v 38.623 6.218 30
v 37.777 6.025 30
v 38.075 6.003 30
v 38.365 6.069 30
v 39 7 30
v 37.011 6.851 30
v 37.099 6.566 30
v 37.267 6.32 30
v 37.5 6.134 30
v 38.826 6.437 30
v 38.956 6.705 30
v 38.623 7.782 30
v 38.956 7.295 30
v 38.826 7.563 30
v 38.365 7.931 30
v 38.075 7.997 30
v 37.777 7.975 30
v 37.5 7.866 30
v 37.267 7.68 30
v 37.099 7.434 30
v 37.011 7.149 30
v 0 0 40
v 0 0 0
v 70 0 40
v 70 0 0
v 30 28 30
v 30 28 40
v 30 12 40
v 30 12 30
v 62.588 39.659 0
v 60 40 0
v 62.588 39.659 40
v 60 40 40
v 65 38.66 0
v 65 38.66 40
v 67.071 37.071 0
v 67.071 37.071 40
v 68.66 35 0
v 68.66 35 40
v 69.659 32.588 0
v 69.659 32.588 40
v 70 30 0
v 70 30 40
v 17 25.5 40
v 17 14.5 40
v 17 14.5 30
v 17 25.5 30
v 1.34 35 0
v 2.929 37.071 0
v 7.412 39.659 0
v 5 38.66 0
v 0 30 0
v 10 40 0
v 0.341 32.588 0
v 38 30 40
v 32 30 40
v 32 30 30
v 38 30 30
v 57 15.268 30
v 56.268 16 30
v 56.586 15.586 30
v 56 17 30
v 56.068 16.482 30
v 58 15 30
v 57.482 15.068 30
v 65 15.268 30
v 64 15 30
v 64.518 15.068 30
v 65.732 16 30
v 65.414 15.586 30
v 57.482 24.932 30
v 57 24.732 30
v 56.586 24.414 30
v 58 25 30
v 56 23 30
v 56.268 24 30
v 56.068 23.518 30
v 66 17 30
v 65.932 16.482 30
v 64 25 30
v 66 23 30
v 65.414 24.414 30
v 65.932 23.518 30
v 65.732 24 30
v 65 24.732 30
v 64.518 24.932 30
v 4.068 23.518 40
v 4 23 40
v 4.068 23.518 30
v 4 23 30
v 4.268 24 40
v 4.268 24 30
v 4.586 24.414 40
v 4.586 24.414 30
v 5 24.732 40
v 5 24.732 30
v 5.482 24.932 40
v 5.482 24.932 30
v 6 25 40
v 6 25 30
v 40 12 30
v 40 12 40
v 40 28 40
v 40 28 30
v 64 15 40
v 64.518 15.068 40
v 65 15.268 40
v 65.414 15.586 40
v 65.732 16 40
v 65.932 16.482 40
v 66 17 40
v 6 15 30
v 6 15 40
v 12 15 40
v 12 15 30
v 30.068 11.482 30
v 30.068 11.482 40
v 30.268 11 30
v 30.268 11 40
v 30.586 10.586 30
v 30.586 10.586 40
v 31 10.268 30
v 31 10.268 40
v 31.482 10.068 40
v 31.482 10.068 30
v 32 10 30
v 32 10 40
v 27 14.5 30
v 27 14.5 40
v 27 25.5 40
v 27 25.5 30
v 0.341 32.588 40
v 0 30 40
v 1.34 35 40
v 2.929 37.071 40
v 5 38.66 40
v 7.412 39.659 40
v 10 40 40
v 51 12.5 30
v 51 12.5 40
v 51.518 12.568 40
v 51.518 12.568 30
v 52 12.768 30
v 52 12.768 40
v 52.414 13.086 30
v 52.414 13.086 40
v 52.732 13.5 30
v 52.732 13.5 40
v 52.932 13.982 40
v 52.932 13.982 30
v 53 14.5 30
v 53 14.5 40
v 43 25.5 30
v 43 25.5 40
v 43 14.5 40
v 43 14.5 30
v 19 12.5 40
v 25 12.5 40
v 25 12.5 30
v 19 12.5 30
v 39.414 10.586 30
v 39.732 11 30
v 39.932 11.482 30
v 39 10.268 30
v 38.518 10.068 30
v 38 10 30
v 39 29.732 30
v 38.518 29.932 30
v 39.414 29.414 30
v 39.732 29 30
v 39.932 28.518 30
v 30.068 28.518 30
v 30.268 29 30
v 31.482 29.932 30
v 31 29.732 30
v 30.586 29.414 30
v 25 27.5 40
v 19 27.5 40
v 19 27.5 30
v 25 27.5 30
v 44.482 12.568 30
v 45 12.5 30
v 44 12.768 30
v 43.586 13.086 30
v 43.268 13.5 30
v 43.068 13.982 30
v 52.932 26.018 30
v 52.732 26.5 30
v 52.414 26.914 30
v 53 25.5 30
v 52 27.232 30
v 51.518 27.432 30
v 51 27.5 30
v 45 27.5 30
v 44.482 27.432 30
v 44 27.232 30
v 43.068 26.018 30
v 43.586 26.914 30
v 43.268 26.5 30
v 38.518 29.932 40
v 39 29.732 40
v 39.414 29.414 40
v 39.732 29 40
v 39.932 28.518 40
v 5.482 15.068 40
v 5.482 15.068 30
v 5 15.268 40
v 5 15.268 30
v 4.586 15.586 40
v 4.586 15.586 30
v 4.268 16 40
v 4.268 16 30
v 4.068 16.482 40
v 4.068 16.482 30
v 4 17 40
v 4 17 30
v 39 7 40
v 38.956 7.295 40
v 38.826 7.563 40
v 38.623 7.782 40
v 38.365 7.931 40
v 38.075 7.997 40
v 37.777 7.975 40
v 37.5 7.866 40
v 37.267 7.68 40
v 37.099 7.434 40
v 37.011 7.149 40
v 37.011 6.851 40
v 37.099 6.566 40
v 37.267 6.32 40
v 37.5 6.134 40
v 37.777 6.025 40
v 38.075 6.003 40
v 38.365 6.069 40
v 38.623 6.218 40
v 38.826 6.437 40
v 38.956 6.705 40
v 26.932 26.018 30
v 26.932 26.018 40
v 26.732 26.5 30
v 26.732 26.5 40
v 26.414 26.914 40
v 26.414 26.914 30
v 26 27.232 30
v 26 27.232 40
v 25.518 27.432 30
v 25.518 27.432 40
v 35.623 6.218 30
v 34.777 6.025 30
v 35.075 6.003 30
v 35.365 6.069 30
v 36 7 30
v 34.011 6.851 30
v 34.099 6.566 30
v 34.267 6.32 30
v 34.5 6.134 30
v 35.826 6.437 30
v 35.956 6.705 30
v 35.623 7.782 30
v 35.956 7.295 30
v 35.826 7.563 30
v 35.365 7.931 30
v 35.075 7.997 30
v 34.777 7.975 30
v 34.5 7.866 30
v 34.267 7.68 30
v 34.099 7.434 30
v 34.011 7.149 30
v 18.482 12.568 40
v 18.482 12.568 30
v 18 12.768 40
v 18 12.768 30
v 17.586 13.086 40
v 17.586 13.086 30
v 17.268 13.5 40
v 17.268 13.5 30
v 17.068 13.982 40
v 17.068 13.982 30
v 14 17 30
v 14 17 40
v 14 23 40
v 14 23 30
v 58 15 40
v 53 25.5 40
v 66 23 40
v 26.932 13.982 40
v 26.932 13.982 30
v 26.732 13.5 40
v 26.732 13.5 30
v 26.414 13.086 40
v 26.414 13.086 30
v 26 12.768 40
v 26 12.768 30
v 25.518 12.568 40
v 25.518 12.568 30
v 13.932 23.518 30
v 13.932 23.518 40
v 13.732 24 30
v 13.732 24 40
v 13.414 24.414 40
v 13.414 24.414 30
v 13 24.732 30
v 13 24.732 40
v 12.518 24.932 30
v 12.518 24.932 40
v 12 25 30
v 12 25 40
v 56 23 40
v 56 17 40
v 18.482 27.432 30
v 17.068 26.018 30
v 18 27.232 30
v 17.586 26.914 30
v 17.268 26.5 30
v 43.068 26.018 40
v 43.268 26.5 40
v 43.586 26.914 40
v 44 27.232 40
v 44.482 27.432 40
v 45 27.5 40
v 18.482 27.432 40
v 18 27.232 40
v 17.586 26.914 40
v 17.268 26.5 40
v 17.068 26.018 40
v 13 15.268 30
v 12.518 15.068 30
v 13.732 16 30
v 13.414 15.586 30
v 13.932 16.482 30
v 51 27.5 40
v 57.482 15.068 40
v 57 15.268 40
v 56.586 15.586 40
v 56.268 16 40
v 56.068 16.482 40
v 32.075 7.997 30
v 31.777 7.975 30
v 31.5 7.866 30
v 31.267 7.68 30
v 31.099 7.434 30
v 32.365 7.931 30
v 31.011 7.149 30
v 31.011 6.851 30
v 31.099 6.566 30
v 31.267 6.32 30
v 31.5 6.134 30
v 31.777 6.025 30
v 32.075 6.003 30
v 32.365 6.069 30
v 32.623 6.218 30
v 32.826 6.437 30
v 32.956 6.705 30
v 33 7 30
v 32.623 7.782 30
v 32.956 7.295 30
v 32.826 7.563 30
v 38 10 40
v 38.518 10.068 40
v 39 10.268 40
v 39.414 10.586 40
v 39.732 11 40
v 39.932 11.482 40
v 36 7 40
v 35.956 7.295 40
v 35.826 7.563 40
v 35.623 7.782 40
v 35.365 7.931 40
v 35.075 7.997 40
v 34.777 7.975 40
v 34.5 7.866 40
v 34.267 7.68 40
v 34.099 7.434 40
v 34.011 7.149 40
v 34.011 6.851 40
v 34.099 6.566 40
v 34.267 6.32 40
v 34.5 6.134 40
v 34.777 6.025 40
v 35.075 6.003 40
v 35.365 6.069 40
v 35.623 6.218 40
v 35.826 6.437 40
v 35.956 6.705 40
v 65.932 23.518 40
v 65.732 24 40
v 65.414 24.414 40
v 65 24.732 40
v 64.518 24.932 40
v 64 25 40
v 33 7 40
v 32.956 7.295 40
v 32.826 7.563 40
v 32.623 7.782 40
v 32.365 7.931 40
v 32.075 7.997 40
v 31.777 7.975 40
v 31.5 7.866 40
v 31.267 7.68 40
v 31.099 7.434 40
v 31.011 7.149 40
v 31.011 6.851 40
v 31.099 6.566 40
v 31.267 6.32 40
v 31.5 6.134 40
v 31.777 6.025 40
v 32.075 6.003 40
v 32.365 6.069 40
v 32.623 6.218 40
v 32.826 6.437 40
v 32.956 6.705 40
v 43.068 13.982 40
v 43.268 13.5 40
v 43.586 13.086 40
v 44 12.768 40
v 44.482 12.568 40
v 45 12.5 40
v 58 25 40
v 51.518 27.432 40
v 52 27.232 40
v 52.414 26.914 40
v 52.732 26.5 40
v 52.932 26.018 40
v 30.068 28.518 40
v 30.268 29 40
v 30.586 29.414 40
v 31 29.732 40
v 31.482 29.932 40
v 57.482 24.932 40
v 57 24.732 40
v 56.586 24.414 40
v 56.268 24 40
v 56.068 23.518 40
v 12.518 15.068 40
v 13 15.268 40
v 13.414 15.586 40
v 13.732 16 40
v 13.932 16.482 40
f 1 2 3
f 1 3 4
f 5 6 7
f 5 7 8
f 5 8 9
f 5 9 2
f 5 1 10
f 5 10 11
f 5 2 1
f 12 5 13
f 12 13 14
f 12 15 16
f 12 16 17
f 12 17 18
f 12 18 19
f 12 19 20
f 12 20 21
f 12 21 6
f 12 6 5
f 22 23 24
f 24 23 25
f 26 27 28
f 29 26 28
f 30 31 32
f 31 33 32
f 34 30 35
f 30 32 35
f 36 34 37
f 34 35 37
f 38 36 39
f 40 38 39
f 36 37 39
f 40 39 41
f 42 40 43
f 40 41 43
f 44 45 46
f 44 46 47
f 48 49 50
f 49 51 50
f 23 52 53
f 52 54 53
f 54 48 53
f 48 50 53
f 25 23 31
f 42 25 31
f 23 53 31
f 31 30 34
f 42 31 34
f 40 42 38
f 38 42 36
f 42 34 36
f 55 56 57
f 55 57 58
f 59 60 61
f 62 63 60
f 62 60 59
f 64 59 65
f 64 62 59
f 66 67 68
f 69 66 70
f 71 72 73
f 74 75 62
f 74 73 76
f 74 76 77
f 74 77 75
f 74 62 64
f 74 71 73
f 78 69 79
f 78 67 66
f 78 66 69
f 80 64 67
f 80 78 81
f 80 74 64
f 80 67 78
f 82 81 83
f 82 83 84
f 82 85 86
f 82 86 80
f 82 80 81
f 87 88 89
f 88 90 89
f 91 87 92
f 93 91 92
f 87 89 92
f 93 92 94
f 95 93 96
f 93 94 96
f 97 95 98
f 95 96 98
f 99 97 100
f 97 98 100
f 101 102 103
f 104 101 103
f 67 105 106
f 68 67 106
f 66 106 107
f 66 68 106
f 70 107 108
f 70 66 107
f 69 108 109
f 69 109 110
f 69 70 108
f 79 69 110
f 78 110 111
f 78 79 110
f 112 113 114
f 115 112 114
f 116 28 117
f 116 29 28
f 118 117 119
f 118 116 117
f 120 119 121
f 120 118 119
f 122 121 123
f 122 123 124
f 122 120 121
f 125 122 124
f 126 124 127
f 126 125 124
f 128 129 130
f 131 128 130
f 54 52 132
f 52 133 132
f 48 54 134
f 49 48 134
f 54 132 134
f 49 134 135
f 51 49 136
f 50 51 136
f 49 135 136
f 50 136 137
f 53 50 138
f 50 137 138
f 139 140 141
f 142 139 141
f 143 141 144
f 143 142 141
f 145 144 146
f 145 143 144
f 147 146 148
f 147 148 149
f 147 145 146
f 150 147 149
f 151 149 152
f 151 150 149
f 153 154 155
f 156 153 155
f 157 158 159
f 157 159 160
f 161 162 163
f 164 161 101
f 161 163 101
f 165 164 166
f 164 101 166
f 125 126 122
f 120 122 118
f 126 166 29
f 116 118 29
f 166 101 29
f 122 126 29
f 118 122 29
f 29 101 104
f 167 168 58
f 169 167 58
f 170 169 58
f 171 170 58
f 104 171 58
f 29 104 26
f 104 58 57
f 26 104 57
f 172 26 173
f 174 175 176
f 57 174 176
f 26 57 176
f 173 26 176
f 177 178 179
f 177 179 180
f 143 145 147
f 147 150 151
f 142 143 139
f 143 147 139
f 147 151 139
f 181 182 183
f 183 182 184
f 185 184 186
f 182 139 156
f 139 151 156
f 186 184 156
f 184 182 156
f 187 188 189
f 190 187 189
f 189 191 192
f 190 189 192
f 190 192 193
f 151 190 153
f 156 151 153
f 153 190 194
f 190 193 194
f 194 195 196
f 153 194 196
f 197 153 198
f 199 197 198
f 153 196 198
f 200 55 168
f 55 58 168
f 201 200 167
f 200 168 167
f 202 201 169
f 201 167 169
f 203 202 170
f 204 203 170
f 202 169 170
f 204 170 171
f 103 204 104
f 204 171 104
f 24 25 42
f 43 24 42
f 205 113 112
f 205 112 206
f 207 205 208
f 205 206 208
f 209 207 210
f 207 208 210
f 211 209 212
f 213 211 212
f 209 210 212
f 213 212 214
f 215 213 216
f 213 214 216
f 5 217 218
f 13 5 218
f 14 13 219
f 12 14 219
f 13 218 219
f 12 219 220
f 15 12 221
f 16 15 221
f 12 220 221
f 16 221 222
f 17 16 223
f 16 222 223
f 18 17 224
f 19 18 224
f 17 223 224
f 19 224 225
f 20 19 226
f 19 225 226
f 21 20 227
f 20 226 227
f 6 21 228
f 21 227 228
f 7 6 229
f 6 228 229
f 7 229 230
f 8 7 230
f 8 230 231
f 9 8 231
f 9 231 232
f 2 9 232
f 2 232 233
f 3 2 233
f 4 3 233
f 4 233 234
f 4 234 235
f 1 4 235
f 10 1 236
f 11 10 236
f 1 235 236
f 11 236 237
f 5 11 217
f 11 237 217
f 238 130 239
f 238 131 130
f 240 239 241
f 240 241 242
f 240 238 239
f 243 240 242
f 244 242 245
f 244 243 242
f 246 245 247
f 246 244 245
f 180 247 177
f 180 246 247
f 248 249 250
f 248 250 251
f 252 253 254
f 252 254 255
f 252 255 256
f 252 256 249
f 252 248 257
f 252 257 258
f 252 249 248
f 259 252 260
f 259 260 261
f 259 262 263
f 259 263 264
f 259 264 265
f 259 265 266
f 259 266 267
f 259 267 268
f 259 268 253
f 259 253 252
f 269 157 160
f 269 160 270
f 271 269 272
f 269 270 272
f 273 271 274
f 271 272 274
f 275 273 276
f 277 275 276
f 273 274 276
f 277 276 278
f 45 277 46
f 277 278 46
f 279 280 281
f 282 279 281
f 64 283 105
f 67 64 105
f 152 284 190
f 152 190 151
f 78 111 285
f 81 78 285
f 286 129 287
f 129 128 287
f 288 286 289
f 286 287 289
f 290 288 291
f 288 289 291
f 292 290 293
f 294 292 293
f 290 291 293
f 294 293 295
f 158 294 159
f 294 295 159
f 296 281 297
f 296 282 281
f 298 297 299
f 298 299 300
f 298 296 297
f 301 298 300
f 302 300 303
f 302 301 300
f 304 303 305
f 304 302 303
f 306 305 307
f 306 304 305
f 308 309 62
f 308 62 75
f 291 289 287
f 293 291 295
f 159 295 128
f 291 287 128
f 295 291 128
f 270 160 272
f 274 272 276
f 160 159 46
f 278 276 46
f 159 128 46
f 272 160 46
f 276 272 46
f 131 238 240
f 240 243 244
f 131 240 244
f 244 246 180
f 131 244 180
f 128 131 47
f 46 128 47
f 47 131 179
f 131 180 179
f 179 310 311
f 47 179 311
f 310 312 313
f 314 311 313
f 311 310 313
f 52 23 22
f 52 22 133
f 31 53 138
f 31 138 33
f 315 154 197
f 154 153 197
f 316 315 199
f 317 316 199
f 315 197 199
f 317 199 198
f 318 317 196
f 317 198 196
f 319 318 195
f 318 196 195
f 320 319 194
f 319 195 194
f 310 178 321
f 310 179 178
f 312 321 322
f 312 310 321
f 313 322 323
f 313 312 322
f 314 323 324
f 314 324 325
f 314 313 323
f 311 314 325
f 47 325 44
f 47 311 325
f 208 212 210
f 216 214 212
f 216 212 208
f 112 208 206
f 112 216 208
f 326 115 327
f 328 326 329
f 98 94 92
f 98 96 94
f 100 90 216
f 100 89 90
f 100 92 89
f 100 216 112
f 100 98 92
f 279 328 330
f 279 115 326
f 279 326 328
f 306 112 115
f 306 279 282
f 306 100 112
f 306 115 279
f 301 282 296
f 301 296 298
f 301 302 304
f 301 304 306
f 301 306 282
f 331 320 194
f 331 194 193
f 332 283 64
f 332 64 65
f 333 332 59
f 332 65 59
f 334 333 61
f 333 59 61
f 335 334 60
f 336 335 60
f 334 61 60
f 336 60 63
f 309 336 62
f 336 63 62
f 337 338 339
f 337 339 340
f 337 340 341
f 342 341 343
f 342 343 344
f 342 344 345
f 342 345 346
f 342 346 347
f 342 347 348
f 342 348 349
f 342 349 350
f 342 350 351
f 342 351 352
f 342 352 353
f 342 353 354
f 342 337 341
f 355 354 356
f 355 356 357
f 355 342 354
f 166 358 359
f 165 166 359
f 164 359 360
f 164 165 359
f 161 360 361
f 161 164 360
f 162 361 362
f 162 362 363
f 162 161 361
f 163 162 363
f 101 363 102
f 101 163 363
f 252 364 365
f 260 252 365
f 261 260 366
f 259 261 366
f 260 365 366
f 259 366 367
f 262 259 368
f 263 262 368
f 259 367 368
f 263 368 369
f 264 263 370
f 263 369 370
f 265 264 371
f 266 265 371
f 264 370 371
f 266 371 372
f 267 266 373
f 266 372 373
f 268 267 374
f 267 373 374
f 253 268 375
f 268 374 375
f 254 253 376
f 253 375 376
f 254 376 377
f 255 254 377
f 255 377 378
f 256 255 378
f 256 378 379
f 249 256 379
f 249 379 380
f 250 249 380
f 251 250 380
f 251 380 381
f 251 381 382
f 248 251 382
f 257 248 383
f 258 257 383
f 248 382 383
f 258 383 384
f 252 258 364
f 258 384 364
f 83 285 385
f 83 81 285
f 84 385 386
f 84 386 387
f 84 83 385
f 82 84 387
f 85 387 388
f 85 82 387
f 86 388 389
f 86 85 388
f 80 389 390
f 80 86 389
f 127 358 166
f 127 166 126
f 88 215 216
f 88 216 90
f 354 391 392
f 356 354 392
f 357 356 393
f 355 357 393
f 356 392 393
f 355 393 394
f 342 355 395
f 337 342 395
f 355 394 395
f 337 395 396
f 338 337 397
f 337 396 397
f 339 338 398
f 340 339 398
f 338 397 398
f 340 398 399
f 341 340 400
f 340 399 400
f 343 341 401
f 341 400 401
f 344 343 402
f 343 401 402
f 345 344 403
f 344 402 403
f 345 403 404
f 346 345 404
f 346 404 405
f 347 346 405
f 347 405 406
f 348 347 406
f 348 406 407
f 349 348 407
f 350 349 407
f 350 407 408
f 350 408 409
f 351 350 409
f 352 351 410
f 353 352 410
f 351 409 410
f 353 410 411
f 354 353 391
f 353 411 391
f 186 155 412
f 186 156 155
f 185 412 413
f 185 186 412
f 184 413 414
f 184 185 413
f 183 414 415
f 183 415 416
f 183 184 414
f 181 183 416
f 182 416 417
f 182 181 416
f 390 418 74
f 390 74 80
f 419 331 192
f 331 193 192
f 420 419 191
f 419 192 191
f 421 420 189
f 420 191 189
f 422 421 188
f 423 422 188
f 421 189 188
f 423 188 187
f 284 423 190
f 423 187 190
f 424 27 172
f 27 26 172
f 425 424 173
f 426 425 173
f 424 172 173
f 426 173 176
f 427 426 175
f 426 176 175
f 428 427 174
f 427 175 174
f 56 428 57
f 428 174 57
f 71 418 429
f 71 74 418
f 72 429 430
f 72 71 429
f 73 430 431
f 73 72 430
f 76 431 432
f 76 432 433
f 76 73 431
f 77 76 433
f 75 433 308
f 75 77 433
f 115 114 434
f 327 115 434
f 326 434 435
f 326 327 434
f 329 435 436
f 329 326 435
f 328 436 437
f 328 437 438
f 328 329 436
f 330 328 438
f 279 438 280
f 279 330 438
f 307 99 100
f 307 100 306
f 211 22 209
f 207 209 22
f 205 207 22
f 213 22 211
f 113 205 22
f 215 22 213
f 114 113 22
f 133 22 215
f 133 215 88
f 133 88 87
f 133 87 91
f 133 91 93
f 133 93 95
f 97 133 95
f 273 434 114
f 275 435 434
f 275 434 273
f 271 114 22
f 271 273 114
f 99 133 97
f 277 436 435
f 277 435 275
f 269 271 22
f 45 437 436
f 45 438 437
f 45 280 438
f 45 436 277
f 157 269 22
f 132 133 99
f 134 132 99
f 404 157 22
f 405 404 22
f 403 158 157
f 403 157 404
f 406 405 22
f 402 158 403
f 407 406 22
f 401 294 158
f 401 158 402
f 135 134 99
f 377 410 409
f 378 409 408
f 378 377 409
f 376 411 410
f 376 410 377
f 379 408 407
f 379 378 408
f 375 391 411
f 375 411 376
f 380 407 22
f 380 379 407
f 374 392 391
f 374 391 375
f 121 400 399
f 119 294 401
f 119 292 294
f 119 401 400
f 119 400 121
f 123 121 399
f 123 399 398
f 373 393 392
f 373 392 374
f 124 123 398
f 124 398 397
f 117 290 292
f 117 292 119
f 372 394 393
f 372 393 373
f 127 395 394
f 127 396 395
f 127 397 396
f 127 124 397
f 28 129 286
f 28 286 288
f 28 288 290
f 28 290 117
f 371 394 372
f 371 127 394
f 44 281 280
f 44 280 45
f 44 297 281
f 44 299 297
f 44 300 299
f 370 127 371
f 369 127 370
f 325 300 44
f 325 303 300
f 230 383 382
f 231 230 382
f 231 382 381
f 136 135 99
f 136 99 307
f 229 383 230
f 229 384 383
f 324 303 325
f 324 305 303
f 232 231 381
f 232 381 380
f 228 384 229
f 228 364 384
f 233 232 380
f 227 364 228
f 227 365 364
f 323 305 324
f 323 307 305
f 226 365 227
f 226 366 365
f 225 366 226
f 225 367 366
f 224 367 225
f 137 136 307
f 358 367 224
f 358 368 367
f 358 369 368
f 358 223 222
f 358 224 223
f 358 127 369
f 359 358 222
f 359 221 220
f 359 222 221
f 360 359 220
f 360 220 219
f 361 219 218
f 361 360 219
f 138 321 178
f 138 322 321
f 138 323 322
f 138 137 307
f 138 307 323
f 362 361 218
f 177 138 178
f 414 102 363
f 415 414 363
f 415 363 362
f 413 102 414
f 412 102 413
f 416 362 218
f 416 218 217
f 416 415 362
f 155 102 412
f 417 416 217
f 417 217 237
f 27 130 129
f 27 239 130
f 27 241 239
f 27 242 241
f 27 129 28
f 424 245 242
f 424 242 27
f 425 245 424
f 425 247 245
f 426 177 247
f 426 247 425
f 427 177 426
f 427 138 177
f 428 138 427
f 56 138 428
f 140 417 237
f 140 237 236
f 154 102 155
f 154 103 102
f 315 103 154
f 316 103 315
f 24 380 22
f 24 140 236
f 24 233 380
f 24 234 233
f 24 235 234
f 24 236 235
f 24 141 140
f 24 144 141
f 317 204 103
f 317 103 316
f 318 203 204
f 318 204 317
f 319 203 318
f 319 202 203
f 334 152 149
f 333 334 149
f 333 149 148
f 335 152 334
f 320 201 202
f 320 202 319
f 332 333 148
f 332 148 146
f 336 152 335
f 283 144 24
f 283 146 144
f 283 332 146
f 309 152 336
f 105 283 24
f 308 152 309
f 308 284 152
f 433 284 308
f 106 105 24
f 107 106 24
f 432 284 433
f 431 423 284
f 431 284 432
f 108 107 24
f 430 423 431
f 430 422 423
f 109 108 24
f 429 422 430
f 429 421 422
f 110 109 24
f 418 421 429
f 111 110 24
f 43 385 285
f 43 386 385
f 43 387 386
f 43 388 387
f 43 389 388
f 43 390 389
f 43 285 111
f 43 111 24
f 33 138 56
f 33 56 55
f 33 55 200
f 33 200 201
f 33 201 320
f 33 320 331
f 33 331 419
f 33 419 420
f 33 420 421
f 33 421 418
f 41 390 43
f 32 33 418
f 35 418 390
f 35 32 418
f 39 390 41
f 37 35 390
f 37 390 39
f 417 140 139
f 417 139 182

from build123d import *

# Parameters (mm, degrees)
SKETCH1_W           = 70
SKETCH1_H           = 40
BOSS_EXTRUDE1_DEPTH = 40
CUT_EXTRUDE1_DEPTH  = 10
CUT_EXTRUDE2_DEPTH  = 10
CUT_EXTRUDE3_DEPTH  = 10
SKETCH5_W           = 10
SKETCH5_H           = 10
CUT_EXTRUDE4_DEPTH  = 10
SKETCH6_W           = 10
SKETCH6_H           = 10
CUT_EXTRUDE5_DEPTH  = 10
FILLET21_R          = 2
FILLET22_R          = 10
SKETCH7_R           = 1
CUT_EXTRUDE6_DEPTH  = 10


with BuildPart() as part:
    # Sketch1 → Boss-Extrude1 (new body)
    with BuildSketch(Plane.XY):
        with Locations((35, 20)):
            Rectangle(SKETCH1_W, SKETCH1_H)
    extrude(amount=BOSS_EXTRUDE1_DEPTH)

    # Sketch2 → Cut-Extrude1 (cut)
    with BuildSketch(Plane.XY.offset(40)):
        Polygon((30, 20), (30, 30), (40, 30), (40, 20), (40, 10), (30, 10), align=None)
    extrude(amount=-CUT_EXTRUDE1_DEPTH, mode=Mode.SUBTRACT)

    # Sketch3 → Cut-Extrude2 (cut)
    with BuildSketch(Plane.XY.offset(40)):
        Polygon((27, 12.5), (17, 12.5), (17, 27.5), (27, 27.5), (27, 15), align=None)
    extrude(amount=-CUT_EXTRUDE2_DEPTH, mode=Mode.SUBTRACT)

    # Sketch4 → Cut-Extrude3 (cut)
    with BuildSketch(Plane.XY.offset(40)):
        Polygon((43, 25), (43, 27.5), (53, 27.5), (53, 12.5), (43, 12.5), align=None)
    extrude(amount=-CUT_EXTRUDE3_DEPTH, mode=Mode.SUBTRACT)

    # Sketch5 → Cut-Extrude4 (cut)
    with BuildSketch(Plane.XY.offset(40)):
        with Locations((9, 20)):
            Rectangle(SKETCH5_W, SKETCH5_H)
    extrude(amount=-CUT_EXTRUDE4_DEPTH, mode=Mode.SUBTRACT)

    # Sketch6 → Cut-Extrude5 (cut)
    with BuildSketch(Plane.XY.offset(40)):
        with Locations((61, 20)):
            Rectangle(SKETCH6_W, SKETCH6_H)
    extrude(amount=-CUT_EXTRUDE5_DEPTH, mode=Mode.SUBTRACT)

    # Fillet21
    fillet21_edges = [part.edges().sort_by_distance(p)[0] for p in [
        (30, 30, 35),
        (40, 30, 35),
        (40, 10, 35),
        (30, 10, 35),
        (17, 27.5, 35),
        (27, 27.5, 35),
        (27, 12.5, 35),
        (17, 12.5, 35),
        (53, 27.5, 35),
        (53, 12.5, 35),
        (43, 12.5, 35),
        (43, 27.5, 35),
        (14, 25, 35),
        (14, 15, 35),
        (4, 15, 35),
        (4, 25, 35),
        (66, 25, 35),
        (66, 15, 35),
        (56, 15, 35),
        (56, 25, 35),
    ]]
    fillet(fillet21_edges, radius=FILLET21_R)

    # Fillet22
    fillet22_edges = [part.edges().sort_by_distance(p)[0] for p in [
        (0, 40, 20),
        (70, 40, 20),
    ]]
    fillet(fillet22_edges, radius=FILLET22_R)

    # Sketch7 → Cut-Extrude6 (cut)
    with BuildSketch(Plane.XY.offset(40)):
        with Locations((32, 7)):
            Circle(SKETCH7_R)
        with Locations((35, 7)):
            Circle(SKETCH7_R)
        with Locations((38, 7)):
            Circle(SKETCH7_R)
    extrude(amount=-CUT_EXTRUDE6_DEPTH, mode=Mode.SUBTRACT)


solid = part.part
